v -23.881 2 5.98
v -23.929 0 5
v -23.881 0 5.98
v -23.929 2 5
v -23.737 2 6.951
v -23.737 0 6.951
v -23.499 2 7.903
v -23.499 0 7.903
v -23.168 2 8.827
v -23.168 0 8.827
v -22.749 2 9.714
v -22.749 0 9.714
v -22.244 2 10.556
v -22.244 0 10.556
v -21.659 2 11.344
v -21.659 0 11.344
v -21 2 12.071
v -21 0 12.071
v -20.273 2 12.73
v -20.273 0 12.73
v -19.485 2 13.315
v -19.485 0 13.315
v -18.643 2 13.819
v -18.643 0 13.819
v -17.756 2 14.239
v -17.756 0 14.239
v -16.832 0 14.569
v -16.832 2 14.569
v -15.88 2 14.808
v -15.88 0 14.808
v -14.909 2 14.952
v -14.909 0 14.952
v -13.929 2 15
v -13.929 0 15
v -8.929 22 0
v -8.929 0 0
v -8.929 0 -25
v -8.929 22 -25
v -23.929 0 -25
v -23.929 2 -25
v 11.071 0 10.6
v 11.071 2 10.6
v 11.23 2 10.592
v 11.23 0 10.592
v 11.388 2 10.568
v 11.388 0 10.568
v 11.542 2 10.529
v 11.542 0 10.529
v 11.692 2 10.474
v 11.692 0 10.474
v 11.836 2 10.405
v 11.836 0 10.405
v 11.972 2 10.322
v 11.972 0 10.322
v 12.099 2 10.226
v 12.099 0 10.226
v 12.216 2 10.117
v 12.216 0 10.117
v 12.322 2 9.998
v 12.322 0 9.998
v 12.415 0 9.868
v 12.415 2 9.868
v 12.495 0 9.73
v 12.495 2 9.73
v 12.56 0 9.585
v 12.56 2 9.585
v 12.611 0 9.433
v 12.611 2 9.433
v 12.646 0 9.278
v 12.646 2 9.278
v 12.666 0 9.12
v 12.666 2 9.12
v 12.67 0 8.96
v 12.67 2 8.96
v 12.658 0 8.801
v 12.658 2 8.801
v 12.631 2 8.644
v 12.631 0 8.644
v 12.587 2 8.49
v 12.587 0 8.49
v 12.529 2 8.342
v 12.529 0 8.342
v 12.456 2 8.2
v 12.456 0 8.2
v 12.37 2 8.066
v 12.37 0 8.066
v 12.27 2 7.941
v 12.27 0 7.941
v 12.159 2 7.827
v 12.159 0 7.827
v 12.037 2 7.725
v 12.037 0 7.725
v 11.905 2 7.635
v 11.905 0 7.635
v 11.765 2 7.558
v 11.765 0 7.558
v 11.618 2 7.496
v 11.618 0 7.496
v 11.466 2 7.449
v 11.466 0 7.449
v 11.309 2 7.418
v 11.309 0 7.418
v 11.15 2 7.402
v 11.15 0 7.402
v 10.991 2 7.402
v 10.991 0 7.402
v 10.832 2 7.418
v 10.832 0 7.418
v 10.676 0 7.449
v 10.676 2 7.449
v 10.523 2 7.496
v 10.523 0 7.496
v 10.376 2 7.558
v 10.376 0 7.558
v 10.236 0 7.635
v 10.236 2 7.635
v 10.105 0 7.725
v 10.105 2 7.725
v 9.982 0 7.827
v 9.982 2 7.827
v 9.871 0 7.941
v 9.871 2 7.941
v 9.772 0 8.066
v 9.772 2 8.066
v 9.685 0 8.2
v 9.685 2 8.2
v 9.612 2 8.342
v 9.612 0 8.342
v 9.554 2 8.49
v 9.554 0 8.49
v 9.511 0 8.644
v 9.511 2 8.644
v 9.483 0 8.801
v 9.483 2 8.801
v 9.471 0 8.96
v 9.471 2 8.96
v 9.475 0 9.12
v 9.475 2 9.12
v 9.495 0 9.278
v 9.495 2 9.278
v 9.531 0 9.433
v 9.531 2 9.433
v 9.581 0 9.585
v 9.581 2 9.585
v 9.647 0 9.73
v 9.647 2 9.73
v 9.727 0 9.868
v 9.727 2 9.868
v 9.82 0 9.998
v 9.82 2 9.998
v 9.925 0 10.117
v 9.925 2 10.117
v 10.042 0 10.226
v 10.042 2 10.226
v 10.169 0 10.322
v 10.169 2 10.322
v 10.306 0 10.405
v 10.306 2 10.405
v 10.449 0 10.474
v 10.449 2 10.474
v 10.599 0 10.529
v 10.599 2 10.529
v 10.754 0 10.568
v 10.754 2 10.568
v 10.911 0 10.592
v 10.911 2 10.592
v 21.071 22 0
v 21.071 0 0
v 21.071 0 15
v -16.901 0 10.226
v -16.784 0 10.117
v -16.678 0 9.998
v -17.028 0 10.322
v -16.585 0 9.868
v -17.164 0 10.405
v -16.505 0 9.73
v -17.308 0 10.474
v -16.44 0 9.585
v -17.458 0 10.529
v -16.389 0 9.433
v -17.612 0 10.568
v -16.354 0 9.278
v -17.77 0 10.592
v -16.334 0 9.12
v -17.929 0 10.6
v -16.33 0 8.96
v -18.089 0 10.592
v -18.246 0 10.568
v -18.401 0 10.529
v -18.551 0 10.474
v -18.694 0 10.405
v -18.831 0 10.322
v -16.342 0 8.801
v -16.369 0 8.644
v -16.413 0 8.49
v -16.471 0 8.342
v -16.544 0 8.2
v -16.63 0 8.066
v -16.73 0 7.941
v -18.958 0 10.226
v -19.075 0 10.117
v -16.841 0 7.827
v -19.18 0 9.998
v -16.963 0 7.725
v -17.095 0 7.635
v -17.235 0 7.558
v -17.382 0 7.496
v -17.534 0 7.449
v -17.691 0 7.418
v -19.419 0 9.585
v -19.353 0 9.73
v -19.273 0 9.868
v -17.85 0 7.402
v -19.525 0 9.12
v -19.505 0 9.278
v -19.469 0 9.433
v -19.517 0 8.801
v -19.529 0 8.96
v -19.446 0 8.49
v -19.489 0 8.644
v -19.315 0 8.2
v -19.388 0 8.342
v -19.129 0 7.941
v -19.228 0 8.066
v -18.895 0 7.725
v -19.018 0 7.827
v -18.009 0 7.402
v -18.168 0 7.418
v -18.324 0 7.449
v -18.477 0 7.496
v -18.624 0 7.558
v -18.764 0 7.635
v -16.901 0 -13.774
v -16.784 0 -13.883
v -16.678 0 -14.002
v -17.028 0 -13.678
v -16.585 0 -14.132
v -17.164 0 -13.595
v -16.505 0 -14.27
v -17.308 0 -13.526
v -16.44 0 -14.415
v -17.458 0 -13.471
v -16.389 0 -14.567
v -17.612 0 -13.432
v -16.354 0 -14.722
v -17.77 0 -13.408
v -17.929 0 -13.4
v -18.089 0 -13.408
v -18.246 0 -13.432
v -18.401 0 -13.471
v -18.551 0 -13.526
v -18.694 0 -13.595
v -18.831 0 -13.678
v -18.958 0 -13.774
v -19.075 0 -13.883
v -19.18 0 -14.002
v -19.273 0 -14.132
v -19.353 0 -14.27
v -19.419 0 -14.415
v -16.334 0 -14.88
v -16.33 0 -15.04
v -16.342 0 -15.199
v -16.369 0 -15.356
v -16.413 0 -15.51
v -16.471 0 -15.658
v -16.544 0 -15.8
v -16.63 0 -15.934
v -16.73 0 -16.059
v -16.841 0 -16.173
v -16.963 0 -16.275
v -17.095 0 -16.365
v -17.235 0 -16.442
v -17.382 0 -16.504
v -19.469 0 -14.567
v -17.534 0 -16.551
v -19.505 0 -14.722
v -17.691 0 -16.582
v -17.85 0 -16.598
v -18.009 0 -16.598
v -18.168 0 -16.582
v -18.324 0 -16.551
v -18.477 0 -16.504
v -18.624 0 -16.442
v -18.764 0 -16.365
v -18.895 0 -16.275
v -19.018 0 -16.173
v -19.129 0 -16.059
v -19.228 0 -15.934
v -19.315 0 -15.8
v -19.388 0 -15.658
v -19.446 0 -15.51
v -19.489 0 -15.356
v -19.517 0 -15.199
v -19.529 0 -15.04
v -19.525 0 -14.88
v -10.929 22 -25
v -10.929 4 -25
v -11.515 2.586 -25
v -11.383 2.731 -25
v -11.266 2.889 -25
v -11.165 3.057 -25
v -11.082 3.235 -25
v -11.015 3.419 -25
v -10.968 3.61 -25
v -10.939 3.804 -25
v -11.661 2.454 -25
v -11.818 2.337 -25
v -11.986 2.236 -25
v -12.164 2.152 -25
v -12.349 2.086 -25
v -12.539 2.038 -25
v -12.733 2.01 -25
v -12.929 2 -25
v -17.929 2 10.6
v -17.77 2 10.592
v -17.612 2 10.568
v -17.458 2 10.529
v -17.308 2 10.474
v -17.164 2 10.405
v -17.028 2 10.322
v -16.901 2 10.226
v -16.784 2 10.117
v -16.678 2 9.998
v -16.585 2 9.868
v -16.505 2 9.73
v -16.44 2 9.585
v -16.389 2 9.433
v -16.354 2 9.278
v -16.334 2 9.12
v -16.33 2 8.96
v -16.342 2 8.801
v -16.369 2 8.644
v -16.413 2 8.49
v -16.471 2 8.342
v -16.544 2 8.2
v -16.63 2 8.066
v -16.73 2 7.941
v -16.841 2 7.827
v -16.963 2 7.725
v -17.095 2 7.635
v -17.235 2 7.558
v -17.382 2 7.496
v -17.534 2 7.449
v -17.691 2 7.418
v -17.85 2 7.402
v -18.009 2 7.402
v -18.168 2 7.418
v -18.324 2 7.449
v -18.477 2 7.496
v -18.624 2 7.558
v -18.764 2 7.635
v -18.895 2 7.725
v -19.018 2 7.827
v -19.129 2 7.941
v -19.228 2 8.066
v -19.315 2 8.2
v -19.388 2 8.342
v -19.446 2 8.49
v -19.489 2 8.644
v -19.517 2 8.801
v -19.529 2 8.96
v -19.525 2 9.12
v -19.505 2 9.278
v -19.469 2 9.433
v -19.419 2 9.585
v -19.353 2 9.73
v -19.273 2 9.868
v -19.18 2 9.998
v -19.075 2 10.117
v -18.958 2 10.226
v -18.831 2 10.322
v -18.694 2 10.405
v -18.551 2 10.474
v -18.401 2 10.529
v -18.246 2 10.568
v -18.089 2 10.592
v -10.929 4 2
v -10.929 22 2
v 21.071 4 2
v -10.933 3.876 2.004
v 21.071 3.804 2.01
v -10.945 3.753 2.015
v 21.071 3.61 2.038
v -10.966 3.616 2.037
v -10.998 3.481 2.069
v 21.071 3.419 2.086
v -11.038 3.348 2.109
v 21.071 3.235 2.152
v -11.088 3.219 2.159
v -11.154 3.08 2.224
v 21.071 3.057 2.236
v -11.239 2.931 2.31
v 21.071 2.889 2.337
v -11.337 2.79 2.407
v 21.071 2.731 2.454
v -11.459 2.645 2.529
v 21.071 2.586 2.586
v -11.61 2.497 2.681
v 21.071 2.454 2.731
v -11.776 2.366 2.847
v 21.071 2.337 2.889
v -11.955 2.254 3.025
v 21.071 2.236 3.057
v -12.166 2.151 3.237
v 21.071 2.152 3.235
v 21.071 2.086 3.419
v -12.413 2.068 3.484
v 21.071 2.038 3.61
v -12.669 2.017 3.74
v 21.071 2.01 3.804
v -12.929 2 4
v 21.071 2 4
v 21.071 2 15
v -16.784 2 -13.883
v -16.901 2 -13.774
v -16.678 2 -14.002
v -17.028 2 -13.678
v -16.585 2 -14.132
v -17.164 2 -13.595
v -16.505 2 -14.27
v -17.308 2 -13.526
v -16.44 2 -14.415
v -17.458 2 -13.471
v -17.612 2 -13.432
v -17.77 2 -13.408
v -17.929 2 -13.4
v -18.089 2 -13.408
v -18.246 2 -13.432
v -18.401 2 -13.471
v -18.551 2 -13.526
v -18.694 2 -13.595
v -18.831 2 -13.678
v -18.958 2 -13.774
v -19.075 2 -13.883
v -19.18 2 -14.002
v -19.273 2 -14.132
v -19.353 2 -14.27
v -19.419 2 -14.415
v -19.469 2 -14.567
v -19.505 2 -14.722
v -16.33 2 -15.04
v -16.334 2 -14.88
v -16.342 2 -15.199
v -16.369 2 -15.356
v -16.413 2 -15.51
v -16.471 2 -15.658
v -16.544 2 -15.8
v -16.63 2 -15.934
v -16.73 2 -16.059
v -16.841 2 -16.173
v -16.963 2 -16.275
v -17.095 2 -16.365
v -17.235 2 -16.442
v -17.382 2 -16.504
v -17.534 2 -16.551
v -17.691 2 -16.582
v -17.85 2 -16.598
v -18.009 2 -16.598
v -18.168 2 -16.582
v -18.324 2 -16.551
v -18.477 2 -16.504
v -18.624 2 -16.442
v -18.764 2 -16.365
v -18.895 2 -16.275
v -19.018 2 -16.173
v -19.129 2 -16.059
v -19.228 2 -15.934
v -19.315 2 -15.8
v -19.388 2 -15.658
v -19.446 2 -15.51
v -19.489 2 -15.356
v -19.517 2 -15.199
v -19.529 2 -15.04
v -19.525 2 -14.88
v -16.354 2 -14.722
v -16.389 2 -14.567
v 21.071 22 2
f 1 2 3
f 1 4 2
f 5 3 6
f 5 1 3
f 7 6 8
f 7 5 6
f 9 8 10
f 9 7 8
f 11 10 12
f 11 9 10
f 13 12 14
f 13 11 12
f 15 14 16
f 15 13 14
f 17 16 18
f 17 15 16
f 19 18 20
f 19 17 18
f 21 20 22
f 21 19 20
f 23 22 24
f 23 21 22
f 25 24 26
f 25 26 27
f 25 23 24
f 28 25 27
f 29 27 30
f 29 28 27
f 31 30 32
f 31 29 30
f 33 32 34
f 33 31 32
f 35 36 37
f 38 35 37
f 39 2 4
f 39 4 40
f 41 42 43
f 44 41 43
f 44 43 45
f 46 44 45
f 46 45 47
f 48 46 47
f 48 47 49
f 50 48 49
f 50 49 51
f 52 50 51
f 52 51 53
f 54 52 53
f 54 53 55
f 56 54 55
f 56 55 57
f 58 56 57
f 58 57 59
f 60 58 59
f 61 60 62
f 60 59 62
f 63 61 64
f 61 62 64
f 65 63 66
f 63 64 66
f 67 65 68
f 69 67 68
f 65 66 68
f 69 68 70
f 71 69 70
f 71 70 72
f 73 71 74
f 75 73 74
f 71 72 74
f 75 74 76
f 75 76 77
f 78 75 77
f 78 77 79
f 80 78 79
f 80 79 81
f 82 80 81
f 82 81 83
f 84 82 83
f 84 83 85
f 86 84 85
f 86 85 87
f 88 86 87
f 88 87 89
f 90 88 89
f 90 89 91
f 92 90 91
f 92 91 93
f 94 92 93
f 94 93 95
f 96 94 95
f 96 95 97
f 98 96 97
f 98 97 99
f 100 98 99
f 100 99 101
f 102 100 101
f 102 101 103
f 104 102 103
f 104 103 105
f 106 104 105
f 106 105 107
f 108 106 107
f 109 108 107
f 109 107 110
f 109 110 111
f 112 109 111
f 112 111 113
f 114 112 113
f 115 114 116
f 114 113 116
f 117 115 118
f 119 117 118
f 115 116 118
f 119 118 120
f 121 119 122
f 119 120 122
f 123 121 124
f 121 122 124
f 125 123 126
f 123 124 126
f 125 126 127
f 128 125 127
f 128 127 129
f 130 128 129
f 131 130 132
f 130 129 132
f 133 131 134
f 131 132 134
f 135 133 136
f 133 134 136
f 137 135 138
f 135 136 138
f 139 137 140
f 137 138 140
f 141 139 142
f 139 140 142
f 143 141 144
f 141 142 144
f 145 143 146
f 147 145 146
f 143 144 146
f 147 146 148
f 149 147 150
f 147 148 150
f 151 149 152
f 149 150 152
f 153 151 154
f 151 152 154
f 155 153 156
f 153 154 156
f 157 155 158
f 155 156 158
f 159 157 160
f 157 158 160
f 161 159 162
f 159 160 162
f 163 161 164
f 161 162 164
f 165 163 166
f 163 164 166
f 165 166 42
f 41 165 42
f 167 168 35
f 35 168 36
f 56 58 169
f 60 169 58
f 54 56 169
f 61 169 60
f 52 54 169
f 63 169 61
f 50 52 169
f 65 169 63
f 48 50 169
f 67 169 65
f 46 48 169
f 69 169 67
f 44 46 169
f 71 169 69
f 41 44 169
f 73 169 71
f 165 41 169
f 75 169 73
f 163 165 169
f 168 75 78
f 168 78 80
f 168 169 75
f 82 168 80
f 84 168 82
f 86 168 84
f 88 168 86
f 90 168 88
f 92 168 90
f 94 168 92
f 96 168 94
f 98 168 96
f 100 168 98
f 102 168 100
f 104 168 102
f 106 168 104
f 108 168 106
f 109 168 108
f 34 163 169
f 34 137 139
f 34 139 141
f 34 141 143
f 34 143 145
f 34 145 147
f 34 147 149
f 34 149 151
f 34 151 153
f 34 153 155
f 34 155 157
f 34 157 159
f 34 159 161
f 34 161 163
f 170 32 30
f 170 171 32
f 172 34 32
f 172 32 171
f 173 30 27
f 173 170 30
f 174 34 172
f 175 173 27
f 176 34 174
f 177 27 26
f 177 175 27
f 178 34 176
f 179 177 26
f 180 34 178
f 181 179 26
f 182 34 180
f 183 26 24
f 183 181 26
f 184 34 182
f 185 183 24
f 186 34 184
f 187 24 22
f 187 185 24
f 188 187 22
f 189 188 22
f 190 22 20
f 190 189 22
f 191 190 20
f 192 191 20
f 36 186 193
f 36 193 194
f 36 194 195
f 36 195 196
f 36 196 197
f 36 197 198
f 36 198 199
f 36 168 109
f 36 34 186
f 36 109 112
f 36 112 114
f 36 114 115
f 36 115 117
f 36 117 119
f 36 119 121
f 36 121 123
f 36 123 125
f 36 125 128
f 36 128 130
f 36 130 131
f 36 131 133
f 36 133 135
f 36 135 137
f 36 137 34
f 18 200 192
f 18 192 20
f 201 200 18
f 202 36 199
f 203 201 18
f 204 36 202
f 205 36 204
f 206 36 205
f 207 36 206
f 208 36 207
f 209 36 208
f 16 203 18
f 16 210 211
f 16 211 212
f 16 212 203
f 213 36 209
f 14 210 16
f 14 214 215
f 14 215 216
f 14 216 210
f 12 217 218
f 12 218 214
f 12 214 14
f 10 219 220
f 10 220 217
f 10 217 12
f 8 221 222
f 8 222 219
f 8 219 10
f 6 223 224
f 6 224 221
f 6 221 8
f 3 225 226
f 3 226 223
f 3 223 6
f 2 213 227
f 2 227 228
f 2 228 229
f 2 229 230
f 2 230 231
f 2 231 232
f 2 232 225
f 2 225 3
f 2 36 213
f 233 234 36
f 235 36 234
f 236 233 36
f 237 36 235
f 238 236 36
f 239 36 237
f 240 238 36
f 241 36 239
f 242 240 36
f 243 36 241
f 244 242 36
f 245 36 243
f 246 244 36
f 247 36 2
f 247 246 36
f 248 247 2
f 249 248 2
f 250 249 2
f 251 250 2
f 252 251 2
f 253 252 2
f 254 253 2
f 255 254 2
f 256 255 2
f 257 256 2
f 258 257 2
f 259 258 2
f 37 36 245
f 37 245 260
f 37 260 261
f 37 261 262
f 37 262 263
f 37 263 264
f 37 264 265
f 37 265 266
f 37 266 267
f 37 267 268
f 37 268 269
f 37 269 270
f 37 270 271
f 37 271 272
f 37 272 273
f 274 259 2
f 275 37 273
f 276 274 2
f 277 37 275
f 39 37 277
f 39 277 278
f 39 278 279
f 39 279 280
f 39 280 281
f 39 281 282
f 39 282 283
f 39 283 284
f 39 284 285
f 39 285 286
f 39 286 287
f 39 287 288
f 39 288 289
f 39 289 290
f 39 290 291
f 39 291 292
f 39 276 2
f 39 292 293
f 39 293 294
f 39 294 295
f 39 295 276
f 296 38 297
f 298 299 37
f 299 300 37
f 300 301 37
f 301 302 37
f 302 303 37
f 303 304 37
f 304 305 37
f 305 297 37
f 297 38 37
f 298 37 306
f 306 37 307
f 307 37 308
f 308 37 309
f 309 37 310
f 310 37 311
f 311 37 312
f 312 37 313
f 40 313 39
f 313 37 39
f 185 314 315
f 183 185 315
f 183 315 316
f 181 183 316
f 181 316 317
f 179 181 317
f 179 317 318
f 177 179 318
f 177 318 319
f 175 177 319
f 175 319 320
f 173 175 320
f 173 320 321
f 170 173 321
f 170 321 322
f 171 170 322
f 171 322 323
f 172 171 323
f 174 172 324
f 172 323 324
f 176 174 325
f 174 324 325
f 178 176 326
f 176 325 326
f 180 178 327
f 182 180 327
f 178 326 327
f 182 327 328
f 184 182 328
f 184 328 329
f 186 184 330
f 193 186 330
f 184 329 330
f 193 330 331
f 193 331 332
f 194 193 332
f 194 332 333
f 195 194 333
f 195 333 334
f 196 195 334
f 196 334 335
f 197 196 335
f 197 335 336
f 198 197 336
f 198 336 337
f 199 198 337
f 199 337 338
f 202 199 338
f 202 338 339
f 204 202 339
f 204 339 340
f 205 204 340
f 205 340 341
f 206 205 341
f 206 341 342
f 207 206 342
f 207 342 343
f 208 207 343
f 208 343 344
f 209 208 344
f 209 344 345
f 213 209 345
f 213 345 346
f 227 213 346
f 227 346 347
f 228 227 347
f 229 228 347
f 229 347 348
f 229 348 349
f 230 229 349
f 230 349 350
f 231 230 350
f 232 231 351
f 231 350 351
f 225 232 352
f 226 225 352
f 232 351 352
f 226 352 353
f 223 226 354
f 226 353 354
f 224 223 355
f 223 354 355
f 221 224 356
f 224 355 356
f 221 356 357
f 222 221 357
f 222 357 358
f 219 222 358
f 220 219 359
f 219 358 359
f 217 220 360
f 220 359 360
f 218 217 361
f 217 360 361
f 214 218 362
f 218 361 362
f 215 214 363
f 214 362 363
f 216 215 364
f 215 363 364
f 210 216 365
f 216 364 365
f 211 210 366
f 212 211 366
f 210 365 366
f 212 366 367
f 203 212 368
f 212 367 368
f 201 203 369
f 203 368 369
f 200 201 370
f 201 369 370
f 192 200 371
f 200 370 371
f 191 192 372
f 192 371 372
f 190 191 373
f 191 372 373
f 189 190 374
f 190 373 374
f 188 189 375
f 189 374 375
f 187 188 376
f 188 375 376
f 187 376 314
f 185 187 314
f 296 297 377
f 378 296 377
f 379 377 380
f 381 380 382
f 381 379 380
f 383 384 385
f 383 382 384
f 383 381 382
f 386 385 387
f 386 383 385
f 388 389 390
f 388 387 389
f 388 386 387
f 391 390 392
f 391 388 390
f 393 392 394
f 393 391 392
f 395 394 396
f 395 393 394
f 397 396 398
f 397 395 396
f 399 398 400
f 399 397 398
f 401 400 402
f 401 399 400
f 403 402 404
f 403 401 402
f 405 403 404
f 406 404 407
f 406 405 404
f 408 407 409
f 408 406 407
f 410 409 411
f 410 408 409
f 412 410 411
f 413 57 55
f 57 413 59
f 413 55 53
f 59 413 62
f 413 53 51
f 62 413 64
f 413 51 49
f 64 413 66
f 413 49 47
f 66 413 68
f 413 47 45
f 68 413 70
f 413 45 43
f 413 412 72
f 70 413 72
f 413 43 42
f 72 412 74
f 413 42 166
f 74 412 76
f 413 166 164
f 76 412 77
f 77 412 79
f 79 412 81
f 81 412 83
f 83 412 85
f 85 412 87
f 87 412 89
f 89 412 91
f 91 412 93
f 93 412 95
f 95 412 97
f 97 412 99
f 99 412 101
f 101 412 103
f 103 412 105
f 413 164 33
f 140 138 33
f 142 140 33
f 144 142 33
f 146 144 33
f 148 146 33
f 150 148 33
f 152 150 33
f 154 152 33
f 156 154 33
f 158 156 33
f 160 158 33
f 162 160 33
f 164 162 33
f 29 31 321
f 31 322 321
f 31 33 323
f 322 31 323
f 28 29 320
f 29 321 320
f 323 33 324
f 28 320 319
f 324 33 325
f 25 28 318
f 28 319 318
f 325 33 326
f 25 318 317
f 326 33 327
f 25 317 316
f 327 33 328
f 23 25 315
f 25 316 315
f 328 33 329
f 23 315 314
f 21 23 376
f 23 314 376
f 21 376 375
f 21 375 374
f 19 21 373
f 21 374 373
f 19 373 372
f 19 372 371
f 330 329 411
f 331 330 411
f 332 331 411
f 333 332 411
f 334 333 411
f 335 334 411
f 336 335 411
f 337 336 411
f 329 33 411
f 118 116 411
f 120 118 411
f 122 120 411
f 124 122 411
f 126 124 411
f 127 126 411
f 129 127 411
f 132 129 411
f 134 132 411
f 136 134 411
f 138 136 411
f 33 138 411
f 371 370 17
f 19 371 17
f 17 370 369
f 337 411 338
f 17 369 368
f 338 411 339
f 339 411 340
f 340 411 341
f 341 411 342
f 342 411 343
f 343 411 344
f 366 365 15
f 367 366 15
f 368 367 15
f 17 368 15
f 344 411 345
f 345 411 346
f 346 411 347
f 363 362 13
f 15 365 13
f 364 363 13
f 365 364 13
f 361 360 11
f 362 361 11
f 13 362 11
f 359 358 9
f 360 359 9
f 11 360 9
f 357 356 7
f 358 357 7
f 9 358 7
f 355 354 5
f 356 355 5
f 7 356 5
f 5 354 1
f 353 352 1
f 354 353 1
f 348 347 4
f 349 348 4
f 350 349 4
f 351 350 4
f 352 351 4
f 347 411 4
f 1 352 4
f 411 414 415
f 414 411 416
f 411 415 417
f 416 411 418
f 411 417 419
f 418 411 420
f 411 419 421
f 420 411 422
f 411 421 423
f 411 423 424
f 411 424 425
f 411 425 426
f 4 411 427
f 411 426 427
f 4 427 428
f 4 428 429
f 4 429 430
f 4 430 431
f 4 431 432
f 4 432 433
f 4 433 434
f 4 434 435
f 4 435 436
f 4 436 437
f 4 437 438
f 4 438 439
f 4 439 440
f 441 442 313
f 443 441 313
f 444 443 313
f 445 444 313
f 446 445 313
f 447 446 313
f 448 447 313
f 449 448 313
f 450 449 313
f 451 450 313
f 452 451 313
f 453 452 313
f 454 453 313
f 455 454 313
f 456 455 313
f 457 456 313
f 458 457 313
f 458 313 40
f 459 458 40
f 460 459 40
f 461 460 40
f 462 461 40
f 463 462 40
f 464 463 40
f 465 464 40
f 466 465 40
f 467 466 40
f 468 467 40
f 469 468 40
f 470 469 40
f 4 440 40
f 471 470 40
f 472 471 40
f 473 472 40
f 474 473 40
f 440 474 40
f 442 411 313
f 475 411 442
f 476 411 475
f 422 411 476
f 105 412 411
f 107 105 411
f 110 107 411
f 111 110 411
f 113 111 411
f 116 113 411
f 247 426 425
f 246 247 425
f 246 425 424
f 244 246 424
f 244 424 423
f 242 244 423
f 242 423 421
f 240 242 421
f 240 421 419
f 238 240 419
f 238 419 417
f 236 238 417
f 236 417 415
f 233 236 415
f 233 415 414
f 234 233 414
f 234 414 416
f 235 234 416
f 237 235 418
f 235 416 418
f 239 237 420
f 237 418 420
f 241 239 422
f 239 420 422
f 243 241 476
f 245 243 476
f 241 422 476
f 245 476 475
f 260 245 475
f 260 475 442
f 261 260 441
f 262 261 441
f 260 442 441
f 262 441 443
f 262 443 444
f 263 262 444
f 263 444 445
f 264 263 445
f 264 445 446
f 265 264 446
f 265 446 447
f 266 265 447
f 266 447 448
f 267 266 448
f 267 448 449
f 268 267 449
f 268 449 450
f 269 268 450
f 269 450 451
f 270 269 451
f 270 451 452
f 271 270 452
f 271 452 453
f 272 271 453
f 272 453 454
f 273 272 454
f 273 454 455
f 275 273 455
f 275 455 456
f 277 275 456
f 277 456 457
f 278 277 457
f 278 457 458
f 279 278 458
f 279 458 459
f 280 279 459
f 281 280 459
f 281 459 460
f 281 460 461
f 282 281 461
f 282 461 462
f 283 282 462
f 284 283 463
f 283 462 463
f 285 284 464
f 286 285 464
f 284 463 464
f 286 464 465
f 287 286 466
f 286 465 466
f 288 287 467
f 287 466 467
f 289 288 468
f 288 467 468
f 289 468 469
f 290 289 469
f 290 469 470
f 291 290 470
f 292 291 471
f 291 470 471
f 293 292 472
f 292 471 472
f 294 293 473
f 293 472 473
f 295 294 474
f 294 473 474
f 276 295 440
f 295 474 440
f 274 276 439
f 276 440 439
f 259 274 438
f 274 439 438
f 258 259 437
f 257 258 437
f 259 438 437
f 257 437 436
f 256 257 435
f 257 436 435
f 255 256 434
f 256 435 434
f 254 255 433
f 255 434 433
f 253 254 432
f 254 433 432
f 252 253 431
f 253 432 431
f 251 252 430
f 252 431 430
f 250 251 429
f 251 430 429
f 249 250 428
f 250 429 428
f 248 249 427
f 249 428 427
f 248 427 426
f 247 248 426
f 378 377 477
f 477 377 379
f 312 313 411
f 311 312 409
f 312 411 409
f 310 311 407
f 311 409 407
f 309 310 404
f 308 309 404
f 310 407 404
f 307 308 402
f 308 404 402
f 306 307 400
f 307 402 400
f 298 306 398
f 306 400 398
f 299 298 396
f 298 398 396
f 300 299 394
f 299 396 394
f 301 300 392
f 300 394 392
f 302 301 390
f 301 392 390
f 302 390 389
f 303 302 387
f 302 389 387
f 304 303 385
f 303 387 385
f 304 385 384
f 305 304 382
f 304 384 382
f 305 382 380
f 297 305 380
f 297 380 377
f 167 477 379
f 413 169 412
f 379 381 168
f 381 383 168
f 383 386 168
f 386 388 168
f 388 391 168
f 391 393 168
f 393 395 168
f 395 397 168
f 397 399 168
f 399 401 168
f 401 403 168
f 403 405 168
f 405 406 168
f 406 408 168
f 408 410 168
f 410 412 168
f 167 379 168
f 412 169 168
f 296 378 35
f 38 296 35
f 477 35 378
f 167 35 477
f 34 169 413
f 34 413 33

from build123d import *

# Parameters (mm, degrees)
BOSS_EXTRUDE1_DEPTH = 2
BOSS_EXTRUDE2_DEPTH = 20
FILLET1_R           = 2
FILLET2_R           = 10
SKETCH3_R           = 1.6
CUT_EXTRUDE1_DEPTH  = 20


with BuildPart() as part:
    # Sketch1 → Boss-Extrude1 (new body)
    with BuildSketch(Plane(origin=(0, 0, 0), x_dir=(1, 0, 0), z_dir=(0, 1, 0))):
        Polygon((-23.929292929, 25), (-8.929292929, 25), (-8.929292929, 0), (21.070707071, 0), (21.070707071, -15), (-23.929292929, -15), align=None)
    extrude(amount=BOSS_EXTRUDE1_DEPTH)

    # Sketch2 → Boss-Extrude2 (add)
    with BuildSketch(Plane(origin=(0, 2, 0), x_dir=(1, 0, 0), z_dir=(0, 1, 0))):
        Polygon((-8.929292929, 25), (-10.929292929, 25), (-10.929292929, -2), (21.070707071, -2), (21.070707071, 0), (-8.929292929, 0), align=None)
    extrude(amount=BOSS_EXTRUDE2_DEPTH)

    # Fillet1
    fillet1_edges = [part.edges().sort_by_distance(p)[0] for p in [
        (-10.929292929, 2, -11.5),
        (5.070707071, 2, 2),
    ]]
    fillet(fillet1_edges, radius=FILLET1_R)

    # Fillet2
    fillet2_edges = [part.edges().sort_by_distance(p)[0] for p in [
        (-23.929292929, 1, 15),
    ]]
    fillet(fillet2_edges, radius=FILLET2_R)

    # Sketch3 → Cut-Extrude1 (cut)
    with BuildSketch(Plane(origin=(0, 2, 0), x_dir=(1, 0, 0), z_dir=(0, 1, 0))):
        with Locations(Location((-17.929292929, 15, 0), (0, 0, 270))):
            Circle(SKETCH3_R)
        with Locations(Location((11.070707071, -9, 0), (0, 0, 270))):
            Circle(SKETCH3_R)
        with Locations(Location((-17.929292929, -9, 0), (0, 0, 270))):
            Circle(SKETCH3_R)
    extrude(amount=-CUT_EXTRUDE1_DEPTH, mode=Mode.SUBTRACT)


solid = part.part
